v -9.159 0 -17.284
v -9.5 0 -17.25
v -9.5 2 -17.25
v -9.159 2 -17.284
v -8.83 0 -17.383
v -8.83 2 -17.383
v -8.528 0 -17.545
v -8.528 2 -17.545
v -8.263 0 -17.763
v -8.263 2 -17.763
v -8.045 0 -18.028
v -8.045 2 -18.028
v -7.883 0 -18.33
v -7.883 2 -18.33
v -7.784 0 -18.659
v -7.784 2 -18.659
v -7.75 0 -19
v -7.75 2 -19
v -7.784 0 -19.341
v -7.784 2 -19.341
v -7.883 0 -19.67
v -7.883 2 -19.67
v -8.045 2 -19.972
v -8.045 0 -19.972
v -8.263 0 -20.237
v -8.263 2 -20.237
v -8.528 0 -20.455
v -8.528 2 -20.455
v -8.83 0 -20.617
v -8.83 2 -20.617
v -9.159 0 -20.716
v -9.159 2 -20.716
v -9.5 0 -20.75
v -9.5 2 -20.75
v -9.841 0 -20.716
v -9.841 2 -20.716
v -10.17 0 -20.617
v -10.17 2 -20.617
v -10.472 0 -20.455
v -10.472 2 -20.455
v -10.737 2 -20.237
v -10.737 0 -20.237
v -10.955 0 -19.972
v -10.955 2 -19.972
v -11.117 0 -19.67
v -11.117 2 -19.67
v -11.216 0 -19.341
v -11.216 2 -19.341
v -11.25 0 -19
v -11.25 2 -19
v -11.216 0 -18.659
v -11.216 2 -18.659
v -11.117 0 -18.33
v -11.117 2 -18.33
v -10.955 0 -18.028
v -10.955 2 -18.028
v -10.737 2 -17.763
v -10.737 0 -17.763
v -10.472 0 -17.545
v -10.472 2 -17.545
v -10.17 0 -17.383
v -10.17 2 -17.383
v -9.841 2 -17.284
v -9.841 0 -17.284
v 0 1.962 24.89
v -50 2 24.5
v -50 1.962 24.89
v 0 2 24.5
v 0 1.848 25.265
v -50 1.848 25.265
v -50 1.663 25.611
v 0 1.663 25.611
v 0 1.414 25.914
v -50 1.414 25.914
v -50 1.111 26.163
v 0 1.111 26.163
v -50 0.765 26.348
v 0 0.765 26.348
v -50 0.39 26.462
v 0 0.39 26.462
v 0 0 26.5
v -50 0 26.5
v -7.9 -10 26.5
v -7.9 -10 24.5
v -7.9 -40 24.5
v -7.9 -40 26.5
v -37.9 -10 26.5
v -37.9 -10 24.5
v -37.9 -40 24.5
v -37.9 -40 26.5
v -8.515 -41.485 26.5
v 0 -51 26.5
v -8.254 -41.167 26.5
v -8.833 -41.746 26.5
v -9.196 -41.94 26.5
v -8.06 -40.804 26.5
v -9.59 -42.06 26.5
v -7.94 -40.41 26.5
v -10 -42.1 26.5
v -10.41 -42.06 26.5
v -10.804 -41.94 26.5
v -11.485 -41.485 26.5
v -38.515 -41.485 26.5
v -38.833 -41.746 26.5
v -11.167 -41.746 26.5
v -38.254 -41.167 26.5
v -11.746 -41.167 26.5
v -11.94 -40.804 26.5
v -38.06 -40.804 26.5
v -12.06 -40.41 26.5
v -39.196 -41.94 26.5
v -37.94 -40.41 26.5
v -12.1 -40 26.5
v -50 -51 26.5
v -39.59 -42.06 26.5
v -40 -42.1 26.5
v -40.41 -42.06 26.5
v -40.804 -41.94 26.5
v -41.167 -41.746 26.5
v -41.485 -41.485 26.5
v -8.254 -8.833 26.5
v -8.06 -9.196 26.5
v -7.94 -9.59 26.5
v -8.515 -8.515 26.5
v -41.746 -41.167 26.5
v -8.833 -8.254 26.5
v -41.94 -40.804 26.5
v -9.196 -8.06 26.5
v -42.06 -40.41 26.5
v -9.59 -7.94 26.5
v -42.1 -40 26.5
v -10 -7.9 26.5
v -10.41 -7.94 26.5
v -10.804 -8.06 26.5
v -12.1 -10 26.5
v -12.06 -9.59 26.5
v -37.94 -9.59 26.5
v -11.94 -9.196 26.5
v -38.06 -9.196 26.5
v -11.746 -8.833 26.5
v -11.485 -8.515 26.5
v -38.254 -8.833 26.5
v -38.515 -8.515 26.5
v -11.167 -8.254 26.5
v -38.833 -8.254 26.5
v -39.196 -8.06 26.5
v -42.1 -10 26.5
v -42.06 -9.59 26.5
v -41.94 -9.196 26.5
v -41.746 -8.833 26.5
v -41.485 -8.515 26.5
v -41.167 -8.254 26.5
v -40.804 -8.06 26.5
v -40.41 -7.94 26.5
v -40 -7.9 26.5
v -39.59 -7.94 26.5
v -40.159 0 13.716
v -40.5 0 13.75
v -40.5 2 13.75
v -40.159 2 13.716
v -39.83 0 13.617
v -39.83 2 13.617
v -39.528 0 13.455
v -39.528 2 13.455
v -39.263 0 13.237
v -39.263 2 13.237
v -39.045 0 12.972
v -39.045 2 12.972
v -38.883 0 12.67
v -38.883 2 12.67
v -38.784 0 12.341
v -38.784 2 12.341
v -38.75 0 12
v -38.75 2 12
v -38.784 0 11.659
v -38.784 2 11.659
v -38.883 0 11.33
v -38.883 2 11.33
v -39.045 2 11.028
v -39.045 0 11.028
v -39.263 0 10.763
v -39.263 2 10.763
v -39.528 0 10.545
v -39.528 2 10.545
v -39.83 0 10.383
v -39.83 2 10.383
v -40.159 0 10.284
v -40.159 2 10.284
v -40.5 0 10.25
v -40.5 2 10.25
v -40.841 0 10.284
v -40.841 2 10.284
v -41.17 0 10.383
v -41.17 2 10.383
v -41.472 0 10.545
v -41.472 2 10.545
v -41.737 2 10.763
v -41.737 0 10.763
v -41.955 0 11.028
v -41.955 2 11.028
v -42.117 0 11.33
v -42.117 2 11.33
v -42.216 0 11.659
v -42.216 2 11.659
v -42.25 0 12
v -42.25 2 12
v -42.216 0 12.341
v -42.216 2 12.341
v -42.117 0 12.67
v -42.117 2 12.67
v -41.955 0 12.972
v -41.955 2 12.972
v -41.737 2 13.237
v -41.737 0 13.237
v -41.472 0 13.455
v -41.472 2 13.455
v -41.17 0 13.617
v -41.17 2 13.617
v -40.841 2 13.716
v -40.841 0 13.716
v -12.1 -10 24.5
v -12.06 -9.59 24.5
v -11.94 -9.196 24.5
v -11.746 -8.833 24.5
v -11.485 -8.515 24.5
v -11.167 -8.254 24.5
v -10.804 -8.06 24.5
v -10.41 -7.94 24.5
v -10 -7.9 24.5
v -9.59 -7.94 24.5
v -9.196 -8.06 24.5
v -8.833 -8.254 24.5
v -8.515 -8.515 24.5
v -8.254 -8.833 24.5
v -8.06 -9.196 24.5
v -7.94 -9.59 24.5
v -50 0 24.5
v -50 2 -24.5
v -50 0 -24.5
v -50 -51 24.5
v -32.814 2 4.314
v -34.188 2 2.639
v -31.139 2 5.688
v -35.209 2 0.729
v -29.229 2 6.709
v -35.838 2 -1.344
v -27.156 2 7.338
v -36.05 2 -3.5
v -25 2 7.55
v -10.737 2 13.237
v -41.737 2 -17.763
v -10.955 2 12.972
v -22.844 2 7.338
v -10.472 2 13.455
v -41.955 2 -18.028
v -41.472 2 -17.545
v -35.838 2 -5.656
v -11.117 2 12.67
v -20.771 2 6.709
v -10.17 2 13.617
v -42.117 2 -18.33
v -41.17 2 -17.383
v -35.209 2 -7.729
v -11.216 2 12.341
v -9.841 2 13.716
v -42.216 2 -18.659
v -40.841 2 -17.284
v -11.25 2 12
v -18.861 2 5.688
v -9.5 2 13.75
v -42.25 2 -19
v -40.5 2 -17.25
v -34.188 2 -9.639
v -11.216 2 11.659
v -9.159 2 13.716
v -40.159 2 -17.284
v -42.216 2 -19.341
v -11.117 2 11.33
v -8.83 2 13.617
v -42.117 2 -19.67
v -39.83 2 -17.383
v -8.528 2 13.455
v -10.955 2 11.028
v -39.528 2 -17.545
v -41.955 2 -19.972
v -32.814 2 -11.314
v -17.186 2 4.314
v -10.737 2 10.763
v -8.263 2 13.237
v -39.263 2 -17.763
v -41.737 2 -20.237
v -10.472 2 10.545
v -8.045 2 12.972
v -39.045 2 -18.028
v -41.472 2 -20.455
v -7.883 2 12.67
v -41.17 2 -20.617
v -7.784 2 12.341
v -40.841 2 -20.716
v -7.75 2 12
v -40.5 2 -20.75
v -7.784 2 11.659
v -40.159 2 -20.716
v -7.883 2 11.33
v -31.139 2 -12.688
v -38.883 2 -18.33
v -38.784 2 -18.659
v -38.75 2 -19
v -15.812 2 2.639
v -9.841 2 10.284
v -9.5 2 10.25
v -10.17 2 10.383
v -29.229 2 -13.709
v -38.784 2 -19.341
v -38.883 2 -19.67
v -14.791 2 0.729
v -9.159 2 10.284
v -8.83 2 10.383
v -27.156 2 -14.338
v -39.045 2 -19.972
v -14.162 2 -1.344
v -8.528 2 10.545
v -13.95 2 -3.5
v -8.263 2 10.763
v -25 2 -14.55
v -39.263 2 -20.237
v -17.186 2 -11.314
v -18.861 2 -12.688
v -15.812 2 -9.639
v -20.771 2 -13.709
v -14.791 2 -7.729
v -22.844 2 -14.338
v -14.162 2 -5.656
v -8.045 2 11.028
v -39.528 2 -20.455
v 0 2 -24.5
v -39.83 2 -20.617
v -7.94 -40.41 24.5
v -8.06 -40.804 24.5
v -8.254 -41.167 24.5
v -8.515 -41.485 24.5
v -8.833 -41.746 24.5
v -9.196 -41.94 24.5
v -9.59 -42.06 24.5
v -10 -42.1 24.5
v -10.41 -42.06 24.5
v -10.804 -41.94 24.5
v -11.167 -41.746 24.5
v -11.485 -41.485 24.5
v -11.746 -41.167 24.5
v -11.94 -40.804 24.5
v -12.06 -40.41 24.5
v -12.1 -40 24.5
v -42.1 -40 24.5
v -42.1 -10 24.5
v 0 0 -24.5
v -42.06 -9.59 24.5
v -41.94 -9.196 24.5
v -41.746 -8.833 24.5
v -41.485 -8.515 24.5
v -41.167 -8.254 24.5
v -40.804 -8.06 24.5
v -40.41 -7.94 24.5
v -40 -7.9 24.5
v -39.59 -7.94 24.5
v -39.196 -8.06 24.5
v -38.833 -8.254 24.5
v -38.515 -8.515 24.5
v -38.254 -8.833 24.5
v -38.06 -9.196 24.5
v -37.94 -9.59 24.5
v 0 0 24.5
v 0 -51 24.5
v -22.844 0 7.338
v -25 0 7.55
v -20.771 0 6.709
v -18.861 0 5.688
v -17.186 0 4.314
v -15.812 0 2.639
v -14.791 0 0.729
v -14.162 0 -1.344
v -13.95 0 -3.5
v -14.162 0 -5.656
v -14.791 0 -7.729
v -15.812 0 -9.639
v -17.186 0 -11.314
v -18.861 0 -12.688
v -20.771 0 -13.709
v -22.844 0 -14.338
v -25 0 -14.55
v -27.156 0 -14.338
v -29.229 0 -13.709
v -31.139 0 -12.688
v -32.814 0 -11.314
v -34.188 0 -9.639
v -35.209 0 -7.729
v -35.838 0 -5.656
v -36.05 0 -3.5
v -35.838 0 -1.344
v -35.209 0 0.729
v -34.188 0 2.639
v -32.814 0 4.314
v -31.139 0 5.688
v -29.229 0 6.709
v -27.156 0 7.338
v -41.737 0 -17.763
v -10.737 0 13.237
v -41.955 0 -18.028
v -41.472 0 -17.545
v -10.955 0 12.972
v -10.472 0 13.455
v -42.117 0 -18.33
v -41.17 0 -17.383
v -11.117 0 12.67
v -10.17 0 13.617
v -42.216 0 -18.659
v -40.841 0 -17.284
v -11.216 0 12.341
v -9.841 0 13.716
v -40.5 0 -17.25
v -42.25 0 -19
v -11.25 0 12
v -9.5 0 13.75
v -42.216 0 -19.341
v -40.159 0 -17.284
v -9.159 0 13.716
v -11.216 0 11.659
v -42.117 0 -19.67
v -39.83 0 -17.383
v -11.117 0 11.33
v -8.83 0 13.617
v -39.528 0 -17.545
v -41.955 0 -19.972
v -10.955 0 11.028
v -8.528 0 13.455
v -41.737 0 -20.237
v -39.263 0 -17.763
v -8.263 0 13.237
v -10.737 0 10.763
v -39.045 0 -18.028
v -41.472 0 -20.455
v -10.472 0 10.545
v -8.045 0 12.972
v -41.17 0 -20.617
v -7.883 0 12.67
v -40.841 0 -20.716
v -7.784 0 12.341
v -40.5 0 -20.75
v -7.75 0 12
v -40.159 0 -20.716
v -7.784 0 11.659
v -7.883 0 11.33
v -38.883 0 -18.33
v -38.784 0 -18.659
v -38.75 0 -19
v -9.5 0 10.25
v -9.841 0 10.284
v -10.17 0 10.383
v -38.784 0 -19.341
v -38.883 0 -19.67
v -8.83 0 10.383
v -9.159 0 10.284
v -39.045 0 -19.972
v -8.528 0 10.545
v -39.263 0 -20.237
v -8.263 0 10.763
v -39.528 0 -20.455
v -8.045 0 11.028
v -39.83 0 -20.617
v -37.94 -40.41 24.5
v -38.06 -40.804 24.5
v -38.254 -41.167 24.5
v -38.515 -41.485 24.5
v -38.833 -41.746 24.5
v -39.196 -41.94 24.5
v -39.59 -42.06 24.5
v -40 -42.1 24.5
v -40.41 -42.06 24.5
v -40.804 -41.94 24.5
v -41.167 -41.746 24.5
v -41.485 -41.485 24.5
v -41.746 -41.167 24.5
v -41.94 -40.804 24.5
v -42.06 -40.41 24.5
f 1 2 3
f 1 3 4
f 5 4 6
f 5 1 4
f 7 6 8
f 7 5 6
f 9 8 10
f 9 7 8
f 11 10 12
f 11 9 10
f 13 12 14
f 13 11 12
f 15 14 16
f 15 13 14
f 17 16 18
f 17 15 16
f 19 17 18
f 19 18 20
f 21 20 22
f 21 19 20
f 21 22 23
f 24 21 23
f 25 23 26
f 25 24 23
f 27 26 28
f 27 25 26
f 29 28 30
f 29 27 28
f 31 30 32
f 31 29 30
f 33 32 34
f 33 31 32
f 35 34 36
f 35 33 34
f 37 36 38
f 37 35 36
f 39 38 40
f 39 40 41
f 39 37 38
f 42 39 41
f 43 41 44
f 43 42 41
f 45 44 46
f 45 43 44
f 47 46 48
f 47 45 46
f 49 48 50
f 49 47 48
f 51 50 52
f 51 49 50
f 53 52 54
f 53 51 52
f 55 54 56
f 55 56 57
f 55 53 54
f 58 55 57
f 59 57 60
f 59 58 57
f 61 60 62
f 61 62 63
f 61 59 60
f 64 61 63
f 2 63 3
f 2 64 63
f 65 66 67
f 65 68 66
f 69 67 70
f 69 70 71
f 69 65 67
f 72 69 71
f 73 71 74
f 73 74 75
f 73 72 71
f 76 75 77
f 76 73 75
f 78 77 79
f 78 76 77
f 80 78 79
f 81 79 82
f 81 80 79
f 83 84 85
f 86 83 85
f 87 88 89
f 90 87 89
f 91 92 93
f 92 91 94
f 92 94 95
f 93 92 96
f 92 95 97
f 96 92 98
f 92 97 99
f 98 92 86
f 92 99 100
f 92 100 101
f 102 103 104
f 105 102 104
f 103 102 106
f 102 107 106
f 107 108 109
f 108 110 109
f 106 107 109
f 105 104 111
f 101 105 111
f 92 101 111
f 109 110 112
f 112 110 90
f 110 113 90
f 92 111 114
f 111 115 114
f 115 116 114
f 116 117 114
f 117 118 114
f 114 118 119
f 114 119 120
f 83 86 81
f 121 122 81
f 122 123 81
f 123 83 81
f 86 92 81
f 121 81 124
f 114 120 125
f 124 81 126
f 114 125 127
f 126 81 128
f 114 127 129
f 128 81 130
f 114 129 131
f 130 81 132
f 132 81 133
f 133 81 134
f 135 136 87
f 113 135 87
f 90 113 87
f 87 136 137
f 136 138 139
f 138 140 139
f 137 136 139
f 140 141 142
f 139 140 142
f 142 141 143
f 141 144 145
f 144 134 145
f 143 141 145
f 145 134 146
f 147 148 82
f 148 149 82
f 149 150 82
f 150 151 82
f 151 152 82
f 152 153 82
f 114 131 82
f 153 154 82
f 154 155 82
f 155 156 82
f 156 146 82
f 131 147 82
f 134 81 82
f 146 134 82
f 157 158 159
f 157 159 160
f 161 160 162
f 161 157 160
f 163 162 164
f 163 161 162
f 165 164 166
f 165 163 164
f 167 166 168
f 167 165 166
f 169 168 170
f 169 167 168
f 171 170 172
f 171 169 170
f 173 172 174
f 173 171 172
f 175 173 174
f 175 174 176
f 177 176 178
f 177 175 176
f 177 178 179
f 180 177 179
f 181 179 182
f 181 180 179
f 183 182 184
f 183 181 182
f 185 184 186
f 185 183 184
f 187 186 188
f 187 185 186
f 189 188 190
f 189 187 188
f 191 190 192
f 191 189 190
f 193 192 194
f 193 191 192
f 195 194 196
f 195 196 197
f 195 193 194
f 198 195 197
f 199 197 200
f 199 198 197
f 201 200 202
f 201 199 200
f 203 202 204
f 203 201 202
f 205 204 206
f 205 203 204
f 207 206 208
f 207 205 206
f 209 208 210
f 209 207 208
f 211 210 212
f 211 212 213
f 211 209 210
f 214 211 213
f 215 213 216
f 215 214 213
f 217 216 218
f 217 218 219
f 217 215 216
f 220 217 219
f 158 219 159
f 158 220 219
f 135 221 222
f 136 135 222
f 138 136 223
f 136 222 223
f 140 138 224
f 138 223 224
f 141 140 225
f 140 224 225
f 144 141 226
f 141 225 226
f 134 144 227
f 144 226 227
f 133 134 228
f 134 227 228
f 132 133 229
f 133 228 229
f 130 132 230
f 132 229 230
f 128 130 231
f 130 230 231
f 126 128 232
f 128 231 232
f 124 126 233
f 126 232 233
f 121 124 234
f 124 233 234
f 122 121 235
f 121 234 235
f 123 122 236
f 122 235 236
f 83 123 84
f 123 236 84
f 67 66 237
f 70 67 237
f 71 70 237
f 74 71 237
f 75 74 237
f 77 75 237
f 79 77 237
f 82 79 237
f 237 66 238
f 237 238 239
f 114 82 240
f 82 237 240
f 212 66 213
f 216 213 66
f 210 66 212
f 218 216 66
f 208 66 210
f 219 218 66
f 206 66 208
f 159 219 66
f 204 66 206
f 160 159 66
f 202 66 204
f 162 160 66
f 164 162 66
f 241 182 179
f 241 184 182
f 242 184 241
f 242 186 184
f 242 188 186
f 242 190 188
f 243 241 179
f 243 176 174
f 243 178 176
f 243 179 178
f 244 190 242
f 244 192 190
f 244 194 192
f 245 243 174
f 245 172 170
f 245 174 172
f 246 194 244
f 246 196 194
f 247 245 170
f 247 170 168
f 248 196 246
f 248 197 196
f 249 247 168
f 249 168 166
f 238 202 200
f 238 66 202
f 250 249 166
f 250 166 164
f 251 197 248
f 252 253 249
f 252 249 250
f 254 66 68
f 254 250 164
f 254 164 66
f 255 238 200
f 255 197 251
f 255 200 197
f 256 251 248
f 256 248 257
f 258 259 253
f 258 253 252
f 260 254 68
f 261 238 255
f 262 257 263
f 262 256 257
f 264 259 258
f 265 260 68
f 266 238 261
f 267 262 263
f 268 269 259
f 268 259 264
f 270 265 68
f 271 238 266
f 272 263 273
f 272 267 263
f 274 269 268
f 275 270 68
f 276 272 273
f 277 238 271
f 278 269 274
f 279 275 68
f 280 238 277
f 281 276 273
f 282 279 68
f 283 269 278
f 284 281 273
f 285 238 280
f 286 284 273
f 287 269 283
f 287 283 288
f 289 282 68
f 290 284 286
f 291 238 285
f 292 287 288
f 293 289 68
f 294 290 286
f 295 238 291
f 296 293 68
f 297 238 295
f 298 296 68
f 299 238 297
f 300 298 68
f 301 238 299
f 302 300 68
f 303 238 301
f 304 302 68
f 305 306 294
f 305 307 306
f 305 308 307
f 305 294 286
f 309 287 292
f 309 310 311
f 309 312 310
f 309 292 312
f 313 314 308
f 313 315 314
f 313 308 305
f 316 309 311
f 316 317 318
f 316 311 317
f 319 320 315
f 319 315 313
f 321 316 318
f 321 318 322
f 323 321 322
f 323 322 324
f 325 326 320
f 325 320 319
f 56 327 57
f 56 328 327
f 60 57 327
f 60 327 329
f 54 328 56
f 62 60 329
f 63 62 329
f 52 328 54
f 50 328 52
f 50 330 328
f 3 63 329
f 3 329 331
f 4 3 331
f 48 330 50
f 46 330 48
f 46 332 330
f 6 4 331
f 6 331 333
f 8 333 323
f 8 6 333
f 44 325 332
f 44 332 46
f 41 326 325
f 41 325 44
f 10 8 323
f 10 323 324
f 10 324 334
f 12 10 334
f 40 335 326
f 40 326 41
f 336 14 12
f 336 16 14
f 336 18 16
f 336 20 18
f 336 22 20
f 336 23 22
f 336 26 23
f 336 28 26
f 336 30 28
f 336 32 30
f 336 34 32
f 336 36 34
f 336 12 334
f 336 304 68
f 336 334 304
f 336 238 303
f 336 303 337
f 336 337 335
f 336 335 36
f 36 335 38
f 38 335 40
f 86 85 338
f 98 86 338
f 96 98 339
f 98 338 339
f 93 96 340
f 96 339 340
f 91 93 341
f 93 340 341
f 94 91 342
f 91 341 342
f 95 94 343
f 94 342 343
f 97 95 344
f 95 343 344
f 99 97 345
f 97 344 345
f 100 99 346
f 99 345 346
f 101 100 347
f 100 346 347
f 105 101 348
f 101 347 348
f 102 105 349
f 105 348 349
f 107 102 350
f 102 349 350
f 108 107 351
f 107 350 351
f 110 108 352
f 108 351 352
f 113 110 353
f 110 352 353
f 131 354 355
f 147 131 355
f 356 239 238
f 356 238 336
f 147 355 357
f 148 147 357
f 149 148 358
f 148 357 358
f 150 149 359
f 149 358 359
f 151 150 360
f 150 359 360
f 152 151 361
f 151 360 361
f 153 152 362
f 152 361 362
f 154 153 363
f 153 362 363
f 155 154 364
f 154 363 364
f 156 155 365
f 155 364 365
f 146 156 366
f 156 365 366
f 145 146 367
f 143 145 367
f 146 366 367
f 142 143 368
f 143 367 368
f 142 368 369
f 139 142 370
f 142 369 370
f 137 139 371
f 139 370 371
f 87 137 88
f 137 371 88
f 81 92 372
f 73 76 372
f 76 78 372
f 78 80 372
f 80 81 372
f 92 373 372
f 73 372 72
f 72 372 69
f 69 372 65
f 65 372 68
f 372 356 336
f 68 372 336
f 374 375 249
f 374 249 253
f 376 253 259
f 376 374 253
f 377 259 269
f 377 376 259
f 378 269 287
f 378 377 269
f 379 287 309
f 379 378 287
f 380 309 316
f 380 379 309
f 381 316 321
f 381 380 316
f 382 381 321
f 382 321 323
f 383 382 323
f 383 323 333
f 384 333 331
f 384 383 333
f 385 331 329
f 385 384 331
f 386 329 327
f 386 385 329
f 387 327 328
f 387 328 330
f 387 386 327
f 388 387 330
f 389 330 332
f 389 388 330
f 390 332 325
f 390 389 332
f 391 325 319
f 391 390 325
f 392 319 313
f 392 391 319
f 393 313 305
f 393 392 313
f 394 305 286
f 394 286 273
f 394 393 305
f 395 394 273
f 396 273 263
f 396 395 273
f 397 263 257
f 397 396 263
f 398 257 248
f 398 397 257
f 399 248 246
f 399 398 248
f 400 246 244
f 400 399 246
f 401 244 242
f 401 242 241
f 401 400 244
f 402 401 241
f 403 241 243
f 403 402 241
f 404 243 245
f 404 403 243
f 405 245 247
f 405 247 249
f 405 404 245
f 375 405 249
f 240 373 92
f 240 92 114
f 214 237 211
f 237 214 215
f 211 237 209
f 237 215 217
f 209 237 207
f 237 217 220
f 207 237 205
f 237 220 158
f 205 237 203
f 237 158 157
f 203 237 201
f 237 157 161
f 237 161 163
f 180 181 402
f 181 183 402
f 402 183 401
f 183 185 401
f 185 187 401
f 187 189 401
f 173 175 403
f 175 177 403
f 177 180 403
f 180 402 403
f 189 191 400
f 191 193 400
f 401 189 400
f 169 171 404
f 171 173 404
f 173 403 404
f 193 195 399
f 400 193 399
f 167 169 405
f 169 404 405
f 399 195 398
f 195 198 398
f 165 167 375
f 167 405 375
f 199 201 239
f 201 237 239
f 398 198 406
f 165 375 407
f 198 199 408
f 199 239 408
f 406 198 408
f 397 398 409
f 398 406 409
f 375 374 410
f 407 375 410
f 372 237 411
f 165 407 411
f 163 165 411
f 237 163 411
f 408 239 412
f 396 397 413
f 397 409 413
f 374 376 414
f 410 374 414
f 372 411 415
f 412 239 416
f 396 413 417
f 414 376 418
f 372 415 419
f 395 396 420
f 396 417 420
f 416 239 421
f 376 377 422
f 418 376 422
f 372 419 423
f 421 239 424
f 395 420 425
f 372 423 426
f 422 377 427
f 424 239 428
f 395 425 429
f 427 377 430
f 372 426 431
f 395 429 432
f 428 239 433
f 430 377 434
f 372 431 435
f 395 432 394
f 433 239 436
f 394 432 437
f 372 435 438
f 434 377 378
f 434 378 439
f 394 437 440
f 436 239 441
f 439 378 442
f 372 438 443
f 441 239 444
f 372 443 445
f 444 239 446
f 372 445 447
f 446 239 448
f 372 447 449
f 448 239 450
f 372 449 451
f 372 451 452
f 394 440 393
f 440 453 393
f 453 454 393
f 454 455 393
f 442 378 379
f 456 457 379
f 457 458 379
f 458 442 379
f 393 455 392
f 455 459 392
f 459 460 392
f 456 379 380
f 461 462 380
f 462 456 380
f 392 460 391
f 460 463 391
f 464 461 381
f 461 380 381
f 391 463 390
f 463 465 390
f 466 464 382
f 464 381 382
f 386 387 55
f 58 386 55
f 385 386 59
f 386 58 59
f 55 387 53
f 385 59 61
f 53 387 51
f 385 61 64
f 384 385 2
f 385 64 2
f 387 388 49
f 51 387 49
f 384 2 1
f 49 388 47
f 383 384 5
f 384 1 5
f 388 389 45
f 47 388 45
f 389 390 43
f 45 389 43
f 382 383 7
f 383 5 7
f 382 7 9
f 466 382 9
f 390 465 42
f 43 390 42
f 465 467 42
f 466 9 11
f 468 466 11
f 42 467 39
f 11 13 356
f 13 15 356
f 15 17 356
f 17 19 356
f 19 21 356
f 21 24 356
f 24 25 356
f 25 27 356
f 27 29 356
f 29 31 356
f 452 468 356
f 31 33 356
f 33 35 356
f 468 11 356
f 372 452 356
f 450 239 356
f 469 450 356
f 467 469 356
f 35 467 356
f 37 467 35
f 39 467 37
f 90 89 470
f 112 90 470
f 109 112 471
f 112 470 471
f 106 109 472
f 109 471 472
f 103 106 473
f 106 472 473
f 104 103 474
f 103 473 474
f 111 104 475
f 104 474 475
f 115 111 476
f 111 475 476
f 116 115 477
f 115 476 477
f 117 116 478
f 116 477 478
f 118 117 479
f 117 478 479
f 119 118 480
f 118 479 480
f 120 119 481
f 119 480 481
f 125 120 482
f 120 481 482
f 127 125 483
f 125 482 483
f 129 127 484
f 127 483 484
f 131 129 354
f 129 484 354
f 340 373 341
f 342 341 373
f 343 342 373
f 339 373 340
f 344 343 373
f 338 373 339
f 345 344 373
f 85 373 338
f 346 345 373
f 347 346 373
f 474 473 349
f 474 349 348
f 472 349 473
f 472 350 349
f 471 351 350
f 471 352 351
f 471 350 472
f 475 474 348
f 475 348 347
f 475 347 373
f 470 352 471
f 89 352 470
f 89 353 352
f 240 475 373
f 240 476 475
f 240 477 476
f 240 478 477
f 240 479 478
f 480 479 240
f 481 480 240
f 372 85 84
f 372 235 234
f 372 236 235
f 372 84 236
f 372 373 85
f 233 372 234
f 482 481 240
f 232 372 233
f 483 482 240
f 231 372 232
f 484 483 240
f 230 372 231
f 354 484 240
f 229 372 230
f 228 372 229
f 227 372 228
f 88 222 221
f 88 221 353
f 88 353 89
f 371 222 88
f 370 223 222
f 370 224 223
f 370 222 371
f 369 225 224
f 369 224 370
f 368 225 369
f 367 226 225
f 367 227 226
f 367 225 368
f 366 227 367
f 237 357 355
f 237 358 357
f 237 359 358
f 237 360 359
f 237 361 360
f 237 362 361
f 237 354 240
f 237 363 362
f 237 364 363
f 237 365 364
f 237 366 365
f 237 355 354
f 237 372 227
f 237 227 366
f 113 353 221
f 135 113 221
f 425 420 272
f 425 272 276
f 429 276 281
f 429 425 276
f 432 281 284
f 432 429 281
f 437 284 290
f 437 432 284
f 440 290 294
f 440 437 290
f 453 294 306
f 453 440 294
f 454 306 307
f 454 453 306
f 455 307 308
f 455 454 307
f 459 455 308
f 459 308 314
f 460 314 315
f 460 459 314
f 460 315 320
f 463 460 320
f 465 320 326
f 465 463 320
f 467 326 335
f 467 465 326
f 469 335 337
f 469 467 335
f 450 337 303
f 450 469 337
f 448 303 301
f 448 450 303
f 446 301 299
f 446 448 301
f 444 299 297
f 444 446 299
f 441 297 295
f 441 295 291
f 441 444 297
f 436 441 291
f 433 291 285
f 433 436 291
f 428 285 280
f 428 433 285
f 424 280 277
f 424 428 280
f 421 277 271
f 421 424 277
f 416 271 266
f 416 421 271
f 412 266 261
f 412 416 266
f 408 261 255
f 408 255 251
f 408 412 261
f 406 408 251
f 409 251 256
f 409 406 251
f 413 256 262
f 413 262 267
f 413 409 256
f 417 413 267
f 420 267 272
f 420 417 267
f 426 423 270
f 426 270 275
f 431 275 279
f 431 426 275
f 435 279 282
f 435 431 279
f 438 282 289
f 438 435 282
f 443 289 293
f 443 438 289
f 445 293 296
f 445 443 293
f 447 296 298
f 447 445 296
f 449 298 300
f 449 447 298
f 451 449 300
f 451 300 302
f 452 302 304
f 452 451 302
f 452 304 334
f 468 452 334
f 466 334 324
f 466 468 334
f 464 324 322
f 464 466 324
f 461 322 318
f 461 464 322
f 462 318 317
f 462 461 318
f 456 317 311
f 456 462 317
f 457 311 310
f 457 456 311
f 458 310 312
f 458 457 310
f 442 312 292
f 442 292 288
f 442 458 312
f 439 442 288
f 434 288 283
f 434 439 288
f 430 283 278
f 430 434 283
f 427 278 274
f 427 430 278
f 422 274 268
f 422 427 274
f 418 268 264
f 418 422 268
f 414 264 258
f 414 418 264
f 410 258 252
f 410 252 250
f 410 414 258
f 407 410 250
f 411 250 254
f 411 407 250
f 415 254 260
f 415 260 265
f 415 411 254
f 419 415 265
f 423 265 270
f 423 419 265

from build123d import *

# Parameters (mm, degrees)
SKETCH_1_W      = 50
SKETCH_1_H      = 49
SKETCH_1_R      = 11.05
SKETCH_1_R_2    = 1.75
EXTRUDE_1_DEPTH = 2
EXTRUDE_2_DEPTH = 2
FILLET_2_R      = 2


with BuildPart() as part:
    # 草图1 → 凸台-拉伸1 (new body)
    with BuildSketch(Plane(origin=(0, 0, 0), x_dir=(1, 0, 0), z_dir=(0, 1, 0))):
        with Locations((-25, 0)):
            Rectangle(SKETCH_1_W, SKETCH_1_H)
        with Locations(Location((-25, 3.5, 0), (0, 0, 270))):
            Circle(SKETCH_1_R, mode=Mode.SUBTRACT)
        with Locations(Location((-40.5, 19, 0), (0, 0, 270))):
            Circle(SKETCH_1_R_2, mode=Mode.SUBTRACT)
        with Locations(Location((-9.5, 19, 0), (0, 0, 270))):
            Circle(SKETCH_1_R_2, mode=Mode.SUBTRACT)
        with Locations(Location((-9.5, -12, 0), (0, 0, 270))):
            Circle(SKETCH_1_R_2, mode=Mode.SUBTRACT)
        with Locations(Location((-40.5, -12, 0), (0, 0, 270))):
            Circle(SKETCH_1_R_2, mode=Mode.SUBTRACT)
    extrude(amount=EXTRUDE_1_DEPTH)

    # 草图2 → 凸台-拉伸2 (add)
    with BuildSketch(Plane.XY.offset(24.5)):
        Polygon((0, 0), (0, -51), (-50, -51), (-50, 0), (-50, 2), (0, 2), align=None)
        with BuildLine():
            Line((-7.9, -10), (-7.9, -40))
            ThreePointArc((-7.9, -40), (-10, -42.1), (-12.1, -40))
            Line((-12.1, -40), (-12.1, -10))
            ThreePointArc((-12.1, -10), (-10, -7.9), (-7.9, -10))
        make_face(mode=Mode.SUBTRACT)
        with BuildLine():
            Line((-37.9, -10), (-37.9, -40))
            ThreePointArc((-37.9, -40), (-40, -42.1), (-42.1, -40))
            Line((-42.1, -40), (-42.1, -10))
            ThreePointArc((-42.1, -10), (-40, -7.9), (-37.9, -10))
        make_face(mode=Mode.SUBTRACT)
    extrude(amount=EXTRUDE_2_DEPTH)

    # 圆角2
    fillet_2_edges = [part.edges().sort_by_distance(p)[0] for p in [
        (-25, 2, 26.5),
    ]]
    fillet(fillet_2_edges, radius=FILLET_2_R)


solid = part.part
